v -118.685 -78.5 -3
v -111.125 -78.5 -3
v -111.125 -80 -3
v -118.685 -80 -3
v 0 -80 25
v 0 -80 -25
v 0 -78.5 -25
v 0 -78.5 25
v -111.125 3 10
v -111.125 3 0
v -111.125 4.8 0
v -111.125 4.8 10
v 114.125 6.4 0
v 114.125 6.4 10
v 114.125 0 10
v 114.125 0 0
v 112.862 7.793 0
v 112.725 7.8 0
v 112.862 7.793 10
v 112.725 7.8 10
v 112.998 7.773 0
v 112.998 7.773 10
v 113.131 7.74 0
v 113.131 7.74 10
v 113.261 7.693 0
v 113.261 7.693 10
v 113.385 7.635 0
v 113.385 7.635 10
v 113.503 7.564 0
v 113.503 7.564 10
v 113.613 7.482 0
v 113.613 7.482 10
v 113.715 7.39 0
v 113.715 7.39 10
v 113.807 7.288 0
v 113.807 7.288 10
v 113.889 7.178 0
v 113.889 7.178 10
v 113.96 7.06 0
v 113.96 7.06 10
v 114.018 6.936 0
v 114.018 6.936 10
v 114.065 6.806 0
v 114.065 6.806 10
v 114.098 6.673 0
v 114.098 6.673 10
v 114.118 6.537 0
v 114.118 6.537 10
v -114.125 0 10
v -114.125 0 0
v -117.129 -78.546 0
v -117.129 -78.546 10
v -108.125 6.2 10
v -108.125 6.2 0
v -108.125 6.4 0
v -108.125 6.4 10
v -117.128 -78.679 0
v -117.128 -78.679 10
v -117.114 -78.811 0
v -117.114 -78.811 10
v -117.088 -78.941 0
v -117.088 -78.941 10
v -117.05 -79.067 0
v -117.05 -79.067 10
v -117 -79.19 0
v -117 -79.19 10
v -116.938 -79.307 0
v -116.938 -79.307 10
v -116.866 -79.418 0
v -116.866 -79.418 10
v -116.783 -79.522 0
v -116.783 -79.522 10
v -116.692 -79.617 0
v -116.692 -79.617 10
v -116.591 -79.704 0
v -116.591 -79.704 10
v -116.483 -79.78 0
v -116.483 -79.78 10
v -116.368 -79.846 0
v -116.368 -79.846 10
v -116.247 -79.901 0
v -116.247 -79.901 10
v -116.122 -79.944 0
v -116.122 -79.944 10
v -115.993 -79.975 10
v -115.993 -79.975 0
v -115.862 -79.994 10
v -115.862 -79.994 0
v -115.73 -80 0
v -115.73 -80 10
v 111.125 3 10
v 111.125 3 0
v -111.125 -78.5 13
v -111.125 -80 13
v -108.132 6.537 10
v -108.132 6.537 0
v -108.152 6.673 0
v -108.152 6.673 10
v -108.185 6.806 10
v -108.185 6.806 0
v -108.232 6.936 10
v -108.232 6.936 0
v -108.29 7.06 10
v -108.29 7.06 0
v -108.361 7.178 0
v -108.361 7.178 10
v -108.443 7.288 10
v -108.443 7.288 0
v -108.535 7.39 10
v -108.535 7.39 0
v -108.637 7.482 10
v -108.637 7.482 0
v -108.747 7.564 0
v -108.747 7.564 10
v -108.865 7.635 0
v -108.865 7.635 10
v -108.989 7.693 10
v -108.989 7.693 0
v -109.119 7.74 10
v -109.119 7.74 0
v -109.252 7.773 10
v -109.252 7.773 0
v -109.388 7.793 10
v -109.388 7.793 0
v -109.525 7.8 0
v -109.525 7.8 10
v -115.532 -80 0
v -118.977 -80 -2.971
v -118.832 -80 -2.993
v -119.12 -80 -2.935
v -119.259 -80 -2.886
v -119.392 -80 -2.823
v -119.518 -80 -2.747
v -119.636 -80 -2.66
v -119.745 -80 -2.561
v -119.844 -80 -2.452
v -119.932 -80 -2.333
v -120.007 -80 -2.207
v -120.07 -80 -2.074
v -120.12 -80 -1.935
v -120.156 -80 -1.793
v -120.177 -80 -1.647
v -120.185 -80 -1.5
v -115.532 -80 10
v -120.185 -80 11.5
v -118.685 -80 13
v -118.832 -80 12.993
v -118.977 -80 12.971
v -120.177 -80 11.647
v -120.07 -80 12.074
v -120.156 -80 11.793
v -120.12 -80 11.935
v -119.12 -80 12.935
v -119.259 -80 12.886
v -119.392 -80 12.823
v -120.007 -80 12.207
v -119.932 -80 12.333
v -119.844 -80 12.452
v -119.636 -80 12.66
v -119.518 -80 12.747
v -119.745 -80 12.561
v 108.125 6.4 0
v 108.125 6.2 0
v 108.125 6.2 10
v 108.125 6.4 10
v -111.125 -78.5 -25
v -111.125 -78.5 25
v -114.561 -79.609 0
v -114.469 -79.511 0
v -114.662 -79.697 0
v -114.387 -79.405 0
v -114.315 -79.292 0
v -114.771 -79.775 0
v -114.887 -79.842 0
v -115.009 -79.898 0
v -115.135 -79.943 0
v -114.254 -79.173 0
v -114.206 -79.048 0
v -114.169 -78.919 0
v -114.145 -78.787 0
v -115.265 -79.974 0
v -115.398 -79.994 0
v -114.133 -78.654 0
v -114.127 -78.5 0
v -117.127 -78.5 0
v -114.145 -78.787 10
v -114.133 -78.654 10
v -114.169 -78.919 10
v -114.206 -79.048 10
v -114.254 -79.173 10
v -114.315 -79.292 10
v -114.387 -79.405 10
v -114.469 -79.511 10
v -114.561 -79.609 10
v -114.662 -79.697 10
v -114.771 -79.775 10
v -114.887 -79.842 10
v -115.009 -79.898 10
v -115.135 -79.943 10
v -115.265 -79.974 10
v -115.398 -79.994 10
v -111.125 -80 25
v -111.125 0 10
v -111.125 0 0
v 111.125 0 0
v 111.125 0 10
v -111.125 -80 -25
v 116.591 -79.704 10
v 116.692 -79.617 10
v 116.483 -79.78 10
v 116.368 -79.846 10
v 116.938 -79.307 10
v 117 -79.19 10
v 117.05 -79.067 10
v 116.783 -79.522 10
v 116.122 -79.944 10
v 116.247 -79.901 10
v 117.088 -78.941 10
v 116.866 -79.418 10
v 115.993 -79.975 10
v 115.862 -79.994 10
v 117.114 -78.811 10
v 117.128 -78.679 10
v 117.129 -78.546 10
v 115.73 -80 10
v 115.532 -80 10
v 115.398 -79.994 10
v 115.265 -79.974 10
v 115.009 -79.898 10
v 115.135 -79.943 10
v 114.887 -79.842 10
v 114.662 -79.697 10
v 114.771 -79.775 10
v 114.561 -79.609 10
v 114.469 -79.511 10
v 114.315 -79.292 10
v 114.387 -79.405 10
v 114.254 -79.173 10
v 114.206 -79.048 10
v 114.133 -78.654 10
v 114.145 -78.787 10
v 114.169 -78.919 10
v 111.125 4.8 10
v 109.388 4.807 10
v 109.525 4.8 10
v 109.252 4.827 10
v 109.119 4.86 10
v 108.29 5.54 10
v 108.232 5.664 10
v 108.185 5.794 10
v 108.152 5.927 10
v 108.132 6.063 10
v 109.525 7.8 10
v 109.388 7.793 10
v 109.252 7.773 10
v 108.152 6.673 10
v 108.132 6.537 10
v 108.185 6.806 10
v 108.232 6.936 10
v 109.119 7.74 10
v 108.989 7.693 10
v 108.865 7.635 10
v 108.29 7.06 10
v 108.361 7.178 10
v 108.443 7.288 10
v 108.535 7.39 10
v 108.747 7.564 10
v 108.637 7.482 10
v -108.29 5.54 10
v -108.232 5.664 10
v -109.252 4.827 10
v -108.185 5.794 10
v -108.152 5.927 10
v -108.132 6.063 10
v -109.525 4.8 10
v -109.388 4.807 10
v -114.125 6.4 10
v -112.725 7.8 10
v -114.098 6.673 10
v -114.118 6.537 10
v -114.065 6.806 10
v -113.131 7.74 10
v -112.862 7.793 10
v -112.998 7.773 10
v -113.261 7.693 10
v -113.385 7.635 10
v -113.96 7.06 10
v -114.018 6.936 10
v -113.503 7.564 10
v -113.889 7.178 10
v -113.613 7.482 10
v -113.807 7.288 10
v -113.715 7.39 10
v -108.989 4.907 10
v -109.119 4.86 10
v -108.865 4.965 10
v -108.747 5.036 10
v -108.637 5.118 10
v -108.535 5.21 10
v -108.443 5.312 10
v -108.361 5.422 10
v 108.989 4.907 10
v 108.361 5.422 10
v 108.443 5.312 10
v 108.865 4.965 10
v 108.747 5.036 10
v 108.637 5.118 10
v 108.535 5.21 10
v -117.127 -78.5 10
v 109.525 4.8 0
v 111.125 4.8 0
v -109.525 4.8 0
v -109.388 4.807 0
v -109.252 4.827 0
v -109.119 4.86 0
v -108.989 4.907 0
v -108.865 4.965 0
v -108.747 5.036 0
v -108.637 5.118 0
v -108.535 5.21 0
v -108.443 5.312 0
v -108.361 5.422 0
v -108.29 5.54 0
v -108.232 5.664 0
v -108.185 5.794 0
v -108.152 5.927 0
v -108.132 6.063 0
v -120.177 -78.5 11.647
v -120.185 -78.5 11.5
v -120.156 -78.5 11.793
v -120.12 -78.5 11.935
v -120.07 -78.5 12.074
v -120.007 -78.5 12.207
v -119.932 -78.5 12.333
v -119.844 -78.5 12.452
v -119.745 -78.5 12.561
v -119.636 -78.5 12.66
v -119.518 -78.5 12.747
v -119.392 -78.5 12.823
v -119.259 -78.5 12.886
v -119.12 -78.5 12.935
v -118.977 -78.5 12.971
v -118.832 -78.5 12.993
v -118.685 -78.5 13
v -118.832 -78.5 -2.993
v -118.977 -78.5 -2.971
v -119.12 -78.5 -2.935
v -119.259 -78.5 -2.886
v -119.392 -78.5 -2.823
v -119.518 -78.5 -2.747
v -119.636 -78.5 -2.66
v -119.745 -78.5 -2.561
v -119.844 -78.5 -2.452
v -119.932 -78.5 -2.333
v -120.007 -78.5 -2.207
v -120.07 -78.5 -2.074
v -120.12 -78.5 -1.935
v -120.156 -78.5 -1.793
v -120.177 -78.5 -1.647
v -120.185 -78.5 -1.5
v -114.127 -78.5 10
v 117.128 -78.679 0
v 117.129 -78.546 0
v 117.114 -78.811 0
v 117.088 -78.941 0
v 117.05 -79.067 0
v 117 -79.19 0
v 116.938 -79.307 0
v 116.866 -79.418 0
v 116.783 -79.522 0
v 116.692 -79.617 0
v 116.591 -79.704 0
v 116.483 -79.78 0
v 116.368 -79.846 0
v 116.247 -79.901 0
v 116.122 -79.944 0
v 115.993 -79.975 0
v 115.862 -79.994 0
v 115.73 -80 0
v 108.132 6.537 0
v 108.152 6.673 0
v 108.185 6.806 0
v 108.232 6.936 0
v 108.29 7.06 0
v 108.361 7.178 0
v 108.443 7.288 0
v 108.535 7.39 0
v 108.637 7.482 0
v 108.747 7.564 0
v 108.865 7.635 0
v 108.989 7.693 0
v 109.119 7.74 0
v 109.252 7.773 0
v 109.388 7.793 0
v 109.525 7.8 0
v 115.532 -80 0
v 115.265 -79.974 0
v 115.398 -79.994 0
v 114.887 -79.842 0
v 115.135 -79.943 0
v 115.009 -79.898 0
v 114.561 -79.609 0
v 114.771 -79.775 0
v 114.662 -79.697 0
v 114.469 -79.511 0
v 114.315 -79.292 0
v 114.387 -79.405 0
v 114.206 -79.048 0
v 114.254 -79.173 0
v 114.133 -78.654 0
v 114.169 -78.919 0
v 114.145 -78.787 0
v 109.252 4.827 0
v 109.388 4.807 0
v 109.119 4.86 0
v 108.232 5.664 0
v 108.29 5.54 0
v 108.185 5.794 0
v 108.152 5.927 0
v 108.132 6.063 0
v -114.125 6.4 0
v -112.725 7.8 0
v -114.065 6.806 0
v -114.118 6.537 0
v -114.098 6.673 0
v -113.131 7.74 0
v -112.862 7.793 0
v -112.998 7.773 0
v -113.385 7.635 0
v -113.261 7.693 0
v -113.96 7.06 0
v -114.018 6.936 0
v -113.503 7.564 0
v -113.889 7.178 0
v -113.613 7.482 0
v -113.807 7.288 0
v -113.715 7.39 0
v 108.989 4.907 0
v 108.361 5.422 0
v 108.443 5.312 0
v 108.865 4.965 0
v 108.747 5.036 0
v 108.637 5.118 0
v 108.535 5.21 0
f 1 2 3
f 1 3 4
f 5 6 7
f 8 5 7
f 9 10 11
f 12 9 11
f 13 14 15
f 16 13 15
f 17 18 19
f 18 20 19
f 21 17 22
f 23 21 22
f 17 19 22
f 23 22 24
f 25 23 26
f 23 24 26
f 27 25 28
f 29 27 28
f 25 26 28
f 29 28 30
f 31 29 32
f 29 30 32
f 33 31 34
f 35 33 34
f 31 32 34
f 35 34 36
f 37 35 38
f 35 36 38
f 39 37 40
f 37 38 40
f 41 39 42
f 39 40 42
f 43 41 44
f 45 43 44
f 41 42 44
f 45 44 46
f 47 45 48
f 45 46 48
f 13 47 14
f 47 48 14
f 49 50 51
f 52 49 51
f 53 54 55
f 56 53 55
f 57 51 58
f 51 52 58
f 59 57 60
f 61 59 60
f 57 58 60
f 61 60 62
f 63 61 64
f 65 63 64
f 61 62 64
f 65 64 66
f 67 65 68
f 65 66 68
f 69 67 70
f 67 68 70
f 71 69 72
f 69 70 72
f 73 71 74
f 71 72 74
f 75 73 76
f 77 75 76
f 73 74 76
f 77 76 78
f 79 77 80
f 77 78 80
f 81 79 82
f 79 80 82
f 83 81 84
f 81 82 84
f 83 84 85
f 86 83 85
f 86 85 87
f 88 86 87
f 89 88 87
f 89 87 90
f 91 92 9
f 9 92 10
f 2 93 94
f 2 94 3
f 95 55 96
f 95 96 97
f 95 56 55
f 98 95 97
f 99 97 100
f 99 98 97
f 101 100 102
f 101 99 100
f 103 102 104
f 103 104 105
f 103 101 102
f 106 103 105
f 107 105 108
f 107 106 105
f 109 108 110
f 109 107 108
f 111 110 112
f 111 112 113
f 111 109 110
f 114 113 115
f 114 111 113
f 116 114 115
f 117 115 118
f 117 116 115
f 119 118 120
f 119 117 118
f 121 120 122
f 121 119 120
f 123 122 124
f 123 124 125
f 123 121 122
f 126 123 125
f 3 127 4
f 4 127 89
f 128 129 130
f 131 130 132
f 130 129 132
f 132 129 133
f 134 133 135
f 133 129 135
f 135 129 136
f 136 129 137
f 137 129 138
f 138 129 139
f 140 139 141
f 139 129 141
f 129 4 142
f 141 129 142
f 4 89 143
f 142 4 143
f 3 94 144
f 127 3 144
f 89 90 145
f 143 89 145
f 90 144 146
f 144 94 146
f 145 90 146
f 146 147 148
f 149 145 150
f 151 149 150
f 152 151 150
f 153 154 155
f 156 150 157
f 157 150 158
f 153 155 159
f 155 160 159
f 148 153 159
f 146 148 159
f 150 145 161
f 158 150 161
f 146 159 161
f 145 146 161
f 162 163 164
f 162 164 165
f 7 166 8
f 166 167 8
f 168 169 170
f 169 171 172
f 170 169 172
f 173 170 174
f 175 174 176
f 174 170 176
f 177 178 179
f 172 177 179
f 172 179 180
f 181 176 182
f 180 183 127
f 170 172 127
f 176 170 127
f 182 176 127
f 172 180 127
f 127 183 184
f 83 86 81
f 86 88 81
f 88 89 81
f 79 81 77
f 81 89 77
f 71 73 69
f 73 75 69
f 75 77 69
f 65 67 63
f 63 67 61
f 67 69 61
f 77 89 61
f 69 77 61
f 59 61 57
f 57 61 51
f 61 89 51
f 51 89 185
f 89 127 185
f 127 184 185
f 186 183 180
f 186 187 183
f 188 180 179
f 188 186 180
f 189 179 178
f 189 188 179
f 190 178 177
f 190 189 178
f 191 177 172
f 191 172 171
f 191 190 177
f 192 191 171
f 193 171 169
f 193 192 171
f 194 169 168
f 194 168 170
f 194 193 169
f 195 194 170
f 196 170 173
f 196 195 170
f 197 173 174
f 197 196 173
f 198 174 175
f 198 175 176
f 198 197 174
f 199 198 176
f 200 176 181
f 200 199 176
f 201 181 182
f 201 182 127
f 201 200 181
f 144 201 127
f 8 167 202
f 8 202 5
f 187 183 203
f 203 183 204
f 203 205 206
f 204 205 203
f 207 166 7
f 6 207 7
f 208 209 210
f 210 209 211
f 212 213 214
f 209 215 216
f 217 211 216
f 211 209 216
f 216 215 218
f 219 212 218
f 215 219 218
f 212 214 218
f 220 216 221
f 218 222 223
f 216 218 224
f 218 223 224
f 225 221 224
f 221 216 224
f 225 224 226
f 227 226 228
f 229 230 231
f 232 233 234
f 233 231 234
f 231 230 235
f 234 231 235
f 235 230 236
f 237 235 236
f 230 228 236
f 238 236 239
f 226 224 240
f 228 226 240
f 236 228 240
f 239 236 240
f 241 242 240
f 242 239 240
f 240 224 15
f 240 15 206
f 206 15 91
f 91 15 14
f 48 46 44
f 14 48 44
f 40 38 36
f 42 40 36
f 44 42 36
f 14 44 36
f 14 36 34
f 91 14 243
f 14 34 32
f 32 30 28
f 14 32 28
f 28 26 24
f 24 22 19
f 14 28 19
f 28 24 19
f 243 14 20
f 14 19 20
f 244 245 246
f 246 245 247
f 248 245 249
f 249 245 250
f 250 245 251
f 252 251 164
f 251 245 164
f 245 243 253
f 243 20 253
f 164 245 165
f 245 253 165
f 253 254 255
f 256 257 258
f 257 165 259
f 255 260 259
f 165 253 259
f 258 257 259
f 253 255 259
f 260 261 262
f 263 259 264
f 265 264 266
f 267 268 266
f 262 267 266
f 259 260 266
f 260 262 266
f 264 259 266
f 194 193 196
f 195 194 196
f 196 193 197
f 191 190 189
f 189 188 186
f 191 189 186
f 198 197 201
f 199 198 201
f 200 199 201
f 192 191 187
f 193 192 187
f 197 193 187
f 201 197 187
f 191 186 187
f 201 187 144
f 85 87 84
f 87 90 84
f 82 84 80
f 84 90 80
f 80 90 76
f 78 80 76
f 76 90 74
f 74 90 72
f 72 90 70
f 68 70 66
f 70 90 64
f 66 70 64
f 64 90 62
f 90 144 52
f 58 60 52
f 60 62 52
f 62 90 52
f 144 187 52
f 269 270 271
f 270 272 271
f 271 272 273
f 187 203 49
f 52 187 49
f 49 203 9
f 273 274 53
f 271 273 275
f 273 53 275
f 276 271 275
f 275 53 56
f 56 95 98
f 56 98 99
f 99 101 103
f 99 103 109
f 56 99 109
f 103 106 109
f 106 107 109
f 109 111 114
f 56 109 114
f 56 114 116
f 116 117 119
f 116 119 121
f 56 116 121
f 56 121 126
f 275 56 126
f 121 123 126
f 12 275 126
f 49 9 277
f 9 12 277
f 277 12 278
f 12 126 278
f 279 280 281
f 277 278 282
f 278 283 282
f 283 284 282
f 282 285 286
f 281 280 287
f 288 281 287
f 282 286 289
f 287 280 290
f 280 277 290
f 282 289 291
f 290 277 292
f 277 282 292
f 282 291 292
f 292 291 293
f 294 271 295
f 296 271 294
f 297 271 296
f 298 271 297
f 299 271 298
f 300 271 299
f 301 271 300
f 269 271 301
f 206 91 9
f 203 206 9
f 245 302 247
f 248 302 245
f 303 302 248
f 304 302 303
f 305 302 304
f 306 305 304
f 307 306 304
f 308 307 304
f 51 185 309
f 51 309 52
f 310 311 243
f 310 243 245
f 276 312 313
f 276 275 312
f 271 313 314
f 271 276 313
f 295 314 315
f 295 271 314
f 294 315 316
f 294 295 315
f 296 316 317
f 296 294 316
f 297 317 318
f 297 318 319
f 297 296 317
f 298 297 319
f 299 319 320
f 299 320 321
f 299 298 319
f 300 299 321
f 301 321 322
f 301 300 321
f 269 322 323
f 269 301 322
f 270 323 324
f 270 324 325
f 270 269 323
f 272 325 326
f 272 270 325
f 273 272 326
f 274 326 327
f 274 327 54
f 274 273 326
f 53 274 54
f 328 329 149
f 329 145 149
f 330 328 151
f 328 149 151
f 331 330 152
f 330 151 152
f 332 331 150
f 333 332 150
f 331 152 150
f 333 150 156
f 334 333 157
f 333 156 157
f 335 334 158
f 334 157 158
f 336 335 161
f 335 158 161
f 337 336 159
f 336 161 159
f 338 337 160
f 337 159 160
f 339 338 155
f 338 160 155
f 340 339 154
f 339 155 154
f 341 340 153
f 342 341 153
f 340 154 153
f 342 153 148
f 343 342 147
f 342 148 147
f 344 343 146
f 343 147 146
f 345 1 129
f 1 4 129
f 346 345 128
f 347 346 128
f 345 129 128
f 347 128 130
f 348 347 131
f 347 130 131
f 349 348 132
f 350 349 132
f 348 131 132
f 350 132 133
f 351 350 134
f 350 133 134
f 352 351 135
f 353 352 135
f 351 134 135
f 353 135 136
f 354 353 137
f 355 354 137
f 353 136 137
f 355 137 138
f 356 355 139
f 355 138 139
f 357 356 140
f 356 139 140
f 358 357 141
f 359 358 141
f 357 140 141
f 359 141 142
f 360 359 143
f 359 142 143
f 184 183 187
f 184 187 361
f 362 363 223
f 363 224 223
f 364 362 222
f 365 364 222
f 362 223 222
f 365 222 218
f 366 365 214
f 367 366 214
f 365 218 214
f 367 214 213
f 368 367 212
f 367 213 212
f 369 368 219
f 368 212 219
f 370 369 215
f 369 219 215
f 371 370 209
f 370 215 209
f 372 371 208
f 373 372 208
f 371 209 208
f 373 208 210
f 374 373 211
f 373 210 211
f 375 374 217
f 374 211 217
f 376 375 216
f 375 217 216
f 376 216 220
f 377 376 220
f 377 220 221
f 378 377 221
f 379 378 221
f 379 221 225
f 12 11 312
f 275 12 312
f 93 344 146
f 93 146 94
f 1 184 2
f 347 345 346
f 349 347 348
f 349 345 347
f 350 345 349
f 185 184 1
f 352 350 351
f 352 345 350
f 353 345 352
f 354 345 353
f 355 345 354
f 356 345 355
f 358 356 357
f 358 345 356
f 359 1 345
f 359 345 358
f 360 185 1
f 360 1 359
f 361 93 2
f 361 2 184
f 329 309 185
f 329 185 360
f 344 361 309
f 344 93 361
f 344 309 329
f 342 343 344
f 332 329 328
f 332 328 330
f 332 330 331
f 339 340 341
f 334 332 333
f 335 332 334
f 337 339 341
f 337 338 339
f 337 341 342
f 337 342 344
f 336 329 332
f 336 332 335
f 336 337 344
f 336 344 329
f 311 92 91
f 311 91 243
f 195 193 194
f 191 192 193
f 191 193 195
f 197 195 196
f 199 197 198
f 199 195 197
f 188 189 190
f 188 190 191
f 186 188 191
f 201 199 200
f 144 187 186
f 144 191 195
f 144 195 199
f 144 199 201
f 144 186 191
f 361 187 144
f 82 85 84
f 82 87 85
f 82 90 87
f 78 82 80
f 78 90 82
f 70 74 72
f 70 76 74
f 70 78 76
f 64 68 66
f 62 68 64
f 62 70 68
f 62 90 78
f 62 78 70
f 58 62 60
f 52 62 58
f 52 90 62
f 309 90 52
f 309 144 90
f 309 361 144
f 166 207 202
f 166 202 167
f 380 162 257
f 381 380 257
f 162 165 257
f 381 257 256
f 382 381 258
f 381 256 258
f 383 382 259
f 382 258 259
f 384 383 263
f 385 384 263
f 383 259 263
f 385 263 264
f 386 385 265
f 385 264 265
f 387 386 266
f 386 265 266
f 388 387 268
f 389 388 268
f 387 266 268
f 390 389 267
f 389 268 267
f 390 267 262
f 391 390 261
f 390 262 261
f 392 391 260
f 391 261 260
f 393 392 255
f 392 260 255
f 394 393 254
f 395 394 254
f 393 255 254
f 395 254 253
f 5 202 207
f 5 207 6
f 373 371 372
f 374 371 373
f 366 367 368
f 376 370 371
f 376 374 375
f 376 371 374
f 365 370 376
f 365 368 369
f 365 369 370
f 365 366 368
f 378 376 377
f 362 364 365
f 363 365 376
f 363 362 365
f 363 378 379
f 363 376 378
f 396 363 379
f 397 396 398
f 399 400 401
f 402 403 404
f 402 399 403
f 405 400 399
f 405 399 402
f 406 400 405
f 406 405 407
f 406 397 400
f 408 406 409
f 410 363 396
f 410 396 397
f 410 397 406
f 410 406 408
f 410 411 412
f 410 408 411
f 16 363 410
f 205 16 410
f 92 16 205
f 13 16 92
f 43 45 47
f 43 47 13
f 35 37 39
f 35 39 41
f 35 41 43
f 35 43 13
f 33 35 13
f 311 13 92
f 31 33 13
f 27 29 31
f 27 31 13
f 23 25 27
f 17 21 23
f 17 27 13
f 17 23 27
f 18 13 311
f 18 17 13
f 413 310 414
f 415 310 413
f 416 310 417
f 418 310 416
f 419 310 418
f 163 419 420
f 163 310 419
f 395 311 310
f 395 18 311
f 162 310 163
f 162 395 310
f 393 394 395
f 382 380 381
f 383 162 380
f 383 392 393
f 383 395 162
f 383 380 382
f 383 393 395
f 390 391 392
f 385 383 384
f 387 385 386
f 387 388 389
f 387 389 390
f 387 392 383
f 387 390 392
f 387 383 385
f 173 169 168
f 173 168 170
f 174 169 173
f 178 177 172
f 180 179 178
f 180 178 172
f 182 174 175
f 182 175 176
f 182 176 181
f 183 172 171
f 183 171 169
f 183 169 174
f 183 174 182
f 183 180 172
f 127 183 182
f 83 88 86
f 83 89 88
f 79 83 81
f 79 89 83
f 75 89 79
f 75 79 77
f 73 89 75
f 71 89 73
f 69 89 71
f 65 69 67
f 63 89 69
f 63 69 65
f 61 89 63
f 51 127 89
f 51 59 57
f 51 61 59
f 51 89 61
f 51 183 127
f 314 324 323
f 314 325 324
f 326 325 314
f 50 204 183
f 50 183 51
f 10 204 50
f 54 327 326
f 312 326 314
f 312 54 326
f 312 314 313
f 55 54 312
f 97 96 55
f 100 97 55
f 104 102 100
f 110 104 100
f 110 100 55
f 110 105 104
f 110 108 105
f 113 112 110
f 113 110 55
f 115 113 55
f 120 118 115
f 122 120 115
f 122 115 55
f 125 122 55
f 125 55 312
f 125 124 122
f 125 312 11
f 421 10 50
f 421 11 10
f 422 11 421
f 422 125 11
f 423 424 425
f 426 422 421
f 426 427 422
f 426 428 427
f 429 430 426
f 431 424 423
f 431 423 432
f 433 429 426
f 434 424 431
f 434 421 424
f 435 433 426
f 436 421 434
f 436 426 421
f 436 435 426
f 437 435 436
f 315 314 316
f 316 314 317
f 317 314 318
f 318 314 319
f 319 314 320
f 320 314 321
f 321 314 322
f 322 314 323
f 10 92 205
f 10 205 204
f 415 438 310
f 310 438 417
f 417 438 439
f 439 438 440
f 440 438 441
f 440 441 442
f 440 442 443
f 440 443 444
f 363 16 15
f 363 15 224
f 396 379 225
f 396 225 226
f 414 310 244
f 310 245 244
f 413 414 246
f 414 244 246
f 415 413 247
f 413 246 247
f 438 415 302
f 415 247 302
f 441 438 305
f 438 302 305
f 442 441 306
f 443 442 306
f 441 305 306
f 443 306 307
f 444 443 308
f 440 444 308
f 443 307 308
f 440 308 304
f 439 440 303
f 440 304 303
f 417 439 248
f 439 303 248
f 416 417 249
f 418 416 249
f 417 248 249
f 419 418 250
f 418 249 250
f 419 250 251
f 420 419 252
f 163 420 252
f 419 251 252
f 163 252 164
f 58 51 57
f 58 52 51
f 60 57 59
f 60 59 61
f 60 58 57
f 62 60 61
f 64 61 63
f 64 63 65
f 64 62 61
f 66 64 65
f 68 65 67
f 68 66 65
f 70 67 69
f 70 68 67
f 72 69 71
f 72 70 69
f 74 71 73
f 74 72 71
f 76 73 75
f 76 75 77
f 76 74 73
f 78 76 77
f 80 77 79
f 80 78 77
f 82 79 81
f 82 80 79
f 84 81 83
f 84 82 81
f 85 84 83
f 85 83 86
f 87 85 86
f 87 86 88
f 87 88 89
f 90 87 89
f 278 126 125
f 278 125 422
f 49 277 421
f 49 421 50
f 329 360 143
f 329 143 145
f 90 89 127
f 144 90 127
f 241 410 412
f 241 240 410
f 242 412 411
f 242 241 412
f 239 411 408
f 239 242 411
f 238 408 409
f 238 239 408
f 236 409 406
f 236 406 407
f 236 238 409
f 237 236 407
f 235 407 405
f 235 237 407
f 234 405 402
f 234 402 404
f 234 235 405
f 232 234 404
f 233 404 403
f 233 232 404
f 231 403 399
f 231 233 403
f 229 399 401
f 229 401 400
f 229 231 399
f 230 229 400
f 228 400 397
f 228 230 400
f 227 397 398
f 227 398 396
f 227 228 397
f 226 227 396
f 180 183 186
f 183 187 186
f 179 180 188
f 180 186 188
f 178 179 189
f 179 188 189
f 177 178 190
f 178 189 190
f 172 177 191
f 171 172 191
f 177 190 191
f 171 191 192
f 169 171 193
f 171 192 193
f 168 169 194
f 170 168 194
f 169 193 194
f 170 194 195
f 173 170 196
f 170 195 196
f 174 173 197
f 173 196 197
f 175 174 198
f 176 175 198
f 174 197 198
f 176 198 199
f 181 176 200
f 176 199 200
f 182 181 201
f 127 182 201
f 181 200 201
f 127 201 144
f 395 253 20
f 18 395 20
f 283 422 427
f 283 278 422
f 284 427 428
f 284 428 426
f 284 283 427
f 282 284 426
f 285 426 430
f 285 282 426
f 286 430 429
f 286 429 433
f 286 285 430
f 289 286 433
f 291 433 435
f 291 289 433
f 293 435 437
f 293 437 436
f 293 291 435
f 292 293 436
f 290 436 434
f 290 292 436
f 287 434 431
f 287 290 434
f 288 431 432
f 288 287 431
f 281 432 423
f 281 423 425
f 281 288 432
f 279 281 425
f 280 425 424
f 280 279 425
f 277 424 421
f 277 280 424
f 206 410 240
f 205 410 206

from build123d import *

# Parameters (mm, degrees)
F2_W     = 111.125
F2_H     = 3
F3_DEPTH = 10
F4_R     = 1.4
F2_H_2   = 1.5
F6_DEPTH = 25
F8_DEPTH = 1.5
F10_R    = 1.5


with BuildPart() as f3:
    # F2 (on Top) → F3 (new body)
    with BuildSketch(Plane.XY):
        Polygon((-114.1845599092, -80), (-111.125, 0), (-114.125, 0), (-117.1845599092, -80), align=None)
        Polygon((-114.125, 0), (-111.125, 0), (-111.125, 3), (-111.125, 4.8), (-108.125, 4.8), (-108.125, 7.8), (-114.125, 7.8), align=None)
        with Locations((-55.5625, 1.5)):
            Rectangle(F2_W, F2_H)
    extrude(amount=F3_DEPTH)

    # F4
    f4_edges = [f3.edges().sort_by_distance(p)[0] for p in [
        (-117.18456, -80, 5),
        (-114.18456, -80, 5),
        (-108.125, 7.8, 5),
        (-108.125, 4.8, 5),
        (-114.125, 7.8, 5),
    ]]
    fillet(f4_edges, radius=F4_R)

    # F5: F3 across face


with BuildPart() as f3_1:
    add(f3.part)
    add(f3.part.mirror(Plane(origin=(0, 1.5, 5), x_dir=(0, 1, 0), z_dir=(1, 0, 0))))


with BuildPart() as f6:
    # F2 (on Top) → F6 (new body, symmetric)
    with BuildSketch(Plane.XY):
        with Locations((-55.5625, -79.25)):
            Rectangle(F2_W, F2_H_2)
    extrude(amount=F6_DEPTH, both=True)


with BuildPart() as f8:
    # F7 (on face) → F8 (new body, through all)
    with BuildSketch(Plane(origin=(0, -78.5, 0), x_dir=(-1, 0, 0), z_dir=(0, 1, 0))):
        Polygon((114.1330638133, 10), (117.1289714083, 10), (117.1845599092, 10), (117.1845599092, 0), (114.1845599092, 0), (114.125, 0), (111.125, 0), (111.125, -3), (120.1845599092, -3), (120.1845599092, 13), (111.125, 13), (111.125, 10), (114.125, 10), align=None)
        Polygon((117.1845599092, 10), (117.1289714083, 10), (114.1330638133, 10), (114.125, 10), (111.125, 10), (111.125, 0), (114.125, 0), (114.1845599092, 0), (117.1845599092, 0), align=None)
    extrude(amount=-F8_DEPTH)

    # F9: cut F3
    add(f3_1.part, mode=Mode.SUBTRACT)

    # F10
    f10_edges = [f8.edges().sort_by_distance(p)[0] for p in [
        (-120.18456, -79.25, 13),
        (-120.18456, -79.25, -3),
    ]]
    fillet(f10_edges, radius=F10_R)


solid = Compound([f3_1.part, f6.part, f8.part])
